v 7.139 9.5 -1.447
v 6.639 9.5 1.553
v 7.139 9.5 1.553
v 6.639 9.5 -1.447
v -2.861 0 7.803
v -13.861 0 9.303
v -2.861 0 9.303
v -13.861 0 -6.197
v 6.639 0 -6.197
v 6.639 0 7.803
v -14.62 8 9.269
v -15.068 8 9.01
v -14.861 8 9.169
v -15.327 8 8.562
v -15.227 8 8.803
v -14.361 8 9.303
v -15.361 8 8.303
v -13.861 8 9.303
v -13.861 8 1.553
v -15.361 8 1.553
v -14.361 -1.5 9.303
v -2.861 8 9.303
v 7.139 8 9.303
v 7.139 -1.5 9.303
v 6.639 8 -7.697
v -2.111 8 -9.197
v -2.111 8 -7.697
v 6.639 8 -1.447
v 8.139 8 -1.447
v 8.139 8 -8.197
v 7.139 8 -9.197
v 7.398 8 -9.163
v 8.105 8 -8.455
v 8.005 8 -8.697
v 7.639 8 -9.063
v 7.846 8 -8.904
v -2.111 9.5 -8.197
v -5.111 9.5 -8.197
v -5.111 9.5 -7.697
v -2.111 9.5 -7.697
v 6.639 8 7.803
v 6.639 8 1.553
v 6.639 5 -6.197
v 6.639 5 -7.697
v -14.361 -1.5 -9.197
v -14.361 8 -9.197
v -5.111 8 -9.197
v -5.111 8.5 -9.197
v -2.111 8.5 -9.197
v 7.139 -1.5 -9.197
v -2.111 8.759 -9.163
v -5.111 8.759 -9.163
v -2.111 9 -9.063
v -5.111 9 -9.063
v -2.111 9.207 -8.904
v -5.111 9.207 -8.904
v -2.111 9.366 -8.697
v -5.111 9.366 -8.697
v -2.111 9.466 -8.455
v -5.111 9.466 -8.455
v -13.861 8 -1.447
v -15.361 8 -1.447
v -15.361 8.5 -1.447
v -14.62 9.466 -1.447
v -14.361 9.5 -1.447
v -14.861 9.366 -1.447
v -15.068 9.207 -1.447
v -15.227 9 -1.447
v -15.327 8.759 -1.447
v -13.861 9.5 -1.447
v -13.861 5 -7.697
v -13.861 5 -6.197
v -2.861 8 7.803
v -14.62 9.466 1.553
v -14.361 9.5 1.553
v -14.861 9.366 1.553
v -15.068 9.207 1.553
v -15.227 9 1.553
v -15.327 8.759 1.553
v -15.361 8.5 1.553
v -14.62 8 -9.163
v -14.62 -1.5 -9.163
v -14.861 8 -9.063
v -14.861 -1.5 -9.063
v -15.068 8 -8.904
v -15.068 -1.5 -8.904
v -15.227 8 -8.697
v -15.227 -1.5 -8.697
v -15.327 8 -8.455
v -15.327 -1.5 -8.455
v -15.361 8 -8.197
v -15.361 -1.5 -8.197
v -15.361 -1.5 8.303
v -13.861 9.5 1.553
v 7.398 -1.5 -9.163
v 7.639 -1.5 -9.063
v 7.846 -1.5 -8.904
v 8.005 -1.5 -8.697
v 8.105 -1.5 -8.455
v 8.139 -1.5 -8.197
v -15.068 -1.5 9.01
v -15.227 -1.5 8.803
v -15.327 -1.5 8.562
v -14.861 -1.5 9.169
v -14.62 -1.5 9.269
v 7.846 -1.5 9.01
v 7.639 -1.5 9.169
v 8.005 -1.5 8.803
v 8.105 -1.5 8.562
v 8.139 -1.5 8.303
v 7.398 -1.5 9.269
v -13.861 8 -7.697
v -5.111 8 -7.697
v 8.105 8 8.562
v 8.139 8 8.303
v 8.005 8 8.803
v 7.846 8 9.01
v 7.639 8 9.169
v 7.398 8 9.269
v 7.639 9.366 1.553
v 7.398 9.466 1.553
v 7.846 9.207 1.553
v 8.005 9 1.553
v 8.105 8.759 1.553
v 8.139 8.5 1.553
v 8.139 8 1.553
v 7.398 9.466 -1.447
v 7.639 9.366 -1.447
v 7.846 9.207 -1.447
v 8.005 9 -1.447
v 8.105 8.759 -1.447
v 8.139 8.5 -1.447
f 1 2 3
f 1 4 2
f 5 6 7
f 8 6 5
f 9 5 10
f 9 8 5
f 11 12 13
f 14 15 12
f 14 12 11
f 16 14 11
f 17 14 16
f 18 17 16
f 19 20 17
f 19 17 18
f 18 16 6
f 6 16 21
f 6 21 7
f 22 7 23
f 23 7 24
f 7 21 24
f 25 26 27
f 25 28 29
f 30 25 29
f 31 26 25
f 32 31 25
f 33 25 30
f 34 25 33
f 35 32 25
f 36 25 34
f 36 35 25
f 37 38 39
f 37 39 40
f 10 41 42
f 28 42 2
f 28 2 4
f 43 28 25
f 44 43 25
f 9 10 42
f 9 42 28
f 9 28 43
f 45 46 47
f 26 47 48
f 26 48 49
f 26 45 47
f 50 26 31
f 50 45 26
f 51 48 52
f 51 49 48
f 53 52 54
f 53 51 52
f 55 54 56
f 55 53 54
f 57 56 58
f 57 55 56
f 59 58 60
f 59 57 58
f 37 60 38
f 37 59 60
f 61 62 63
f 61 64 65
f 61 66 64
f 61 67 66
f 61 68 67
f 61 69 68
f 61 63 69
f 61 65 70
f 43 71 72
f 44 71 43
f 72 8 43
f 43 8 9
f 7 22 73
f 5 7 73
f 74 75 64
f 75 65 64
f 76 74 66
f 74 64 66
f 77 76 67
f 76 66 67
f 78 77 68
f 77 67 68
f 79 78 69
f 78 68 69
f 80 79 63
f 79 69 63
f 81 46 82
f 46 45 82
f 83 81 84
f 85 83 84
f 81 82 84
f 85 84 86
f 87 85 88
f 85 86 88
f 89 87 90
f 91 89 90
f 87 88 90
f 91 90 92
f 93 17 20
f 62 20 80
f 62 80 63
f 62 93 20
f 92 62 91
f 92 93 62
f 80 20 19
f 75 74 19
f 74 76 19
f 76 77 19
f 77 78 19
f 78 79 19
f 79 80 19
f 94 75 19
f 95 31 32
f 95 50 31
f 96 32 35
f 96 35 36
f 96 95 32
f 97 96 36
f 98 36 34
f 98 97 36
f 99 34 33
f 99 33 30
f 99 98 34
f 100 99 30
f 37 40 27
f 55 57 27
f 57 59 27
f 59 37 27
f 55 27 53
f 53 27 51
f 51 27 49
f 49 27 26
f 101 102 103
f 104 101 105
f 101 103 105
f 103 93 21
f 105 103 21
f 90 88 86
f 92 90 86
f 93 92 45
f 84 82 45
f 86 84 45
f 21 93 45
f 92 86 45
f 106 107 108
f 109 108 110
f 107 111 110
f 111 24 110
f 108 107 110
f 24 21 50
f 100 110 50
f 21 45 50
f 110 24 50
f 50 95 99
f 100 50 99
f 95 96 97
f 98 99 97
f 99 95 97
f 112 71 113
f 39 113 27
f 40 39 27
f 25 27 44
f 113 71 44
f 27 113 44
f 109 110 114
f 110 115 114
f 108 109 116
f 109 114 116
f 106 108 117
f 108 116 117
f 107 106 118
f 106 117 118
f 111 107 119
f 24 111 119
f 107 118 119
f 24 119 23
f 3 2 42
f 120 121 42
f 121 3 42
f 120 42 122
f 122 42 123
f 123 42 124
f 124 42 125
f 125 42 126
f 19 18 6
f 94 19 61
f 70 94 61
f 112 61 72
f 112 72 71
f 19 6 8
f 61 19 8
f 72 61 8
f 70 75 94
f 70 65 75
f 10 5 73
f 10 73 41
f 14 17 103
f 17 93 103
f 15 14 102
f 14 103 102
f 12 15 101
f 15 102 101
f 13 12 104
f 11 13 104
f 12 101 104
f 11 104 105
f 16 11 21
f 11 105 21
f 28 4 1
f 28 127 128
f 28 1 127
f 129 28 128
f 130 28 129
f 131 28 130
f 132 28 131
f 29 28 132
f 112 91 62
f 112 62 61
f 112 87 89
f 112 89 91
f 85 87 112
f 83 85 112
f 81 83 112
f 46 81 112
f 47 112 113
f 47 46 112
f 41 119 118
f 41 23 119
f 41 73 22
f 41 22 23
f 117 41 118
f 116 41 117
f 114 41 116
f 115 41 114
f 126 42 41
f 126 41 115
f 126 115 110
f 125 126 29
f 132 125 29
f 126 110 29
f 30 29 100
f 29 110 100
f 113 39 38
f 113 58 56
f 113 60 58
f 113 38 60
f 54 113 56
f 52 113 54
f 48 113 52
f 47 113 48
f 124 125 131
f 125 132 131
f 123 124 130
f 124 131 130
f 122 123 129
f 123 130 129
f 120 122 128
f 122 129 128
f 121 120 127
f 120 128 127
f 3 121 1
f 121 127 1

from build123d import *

# Parameters (mm, degrees)
SKETCH1_W                 = 20.5
SKETCH1_H                 = 15.5
BOSS_EXTRUDE1_DEPTH       = 8
SHELL1_T                  = 1.5
BOSS_EXTRUDE2_START       = 8
BOSS_EXTRUDE2_OUTLINE_W   = 1.5
BOSS_EXTRUDE2_OUTLINE_H   = 3
BOSS_EXTRUDE2_OUTLINE_W_2 = 3
BOSS_EXTRUDE2_OUTLINE_H_2 = 1.5
BOSS_EXTRUDE2_DEPTH       = 1.5
SKETCH3_W                 = 10
SKETCH3_H                 = 1.5
CUT_EXTRUDE1_DEPTH        = 8
SKETCH4_W                 = 20.5
SKETCH4_H                 = 1.5
BOSS_EXTRUDE3_DEPTH       = 5
FILLET1_R                 = 1
FILLET2_R                 = 1
FILLET3_R                 = 1
SKETCH5_W                 = 1
SKETCH5_H                 = 1.5
CUT_EXTRUDE3_DEPTH        = 8


# Read off the part's stored shape, not the designer's step: Boss-Extrude2
with BuildPart() as part:
    # Sketch1 → Boss-Extrude1 (new body)
    with BuildSketch(Plane(origin=(0, 0, 0), x_dir=(1, 0, 0), z_dir=(0, 1, 0))):
        with Locations((-3.611209964, -0.053380783)):
            Rectangle(SKETCH1_W, SKETCH1_H)
    extrude(amount=BOSS_EXTRUDE1_DEPTH)

    # Shell1
    shell1_openings = [part.faces().sort_by_distance(p)[0] for p in [
        (-3.611209964, 8, 0.053380783),
    ]]
    offset(amount=SHELL1_T, openings=shell1_openings, kind=Kind.INTERSECTION)

    # Boss-Extrude2 outline → Boss-Extrude2 (add)
    with BuildSketch(Plane(origin=(0, 0, 0), x_dir=(1, 0, 0), z_dir=(0, 1, 0)).offset(BOSS_EXTRUDE2_START)):
        with Locations((-14.611209964, -0.053380783)):
            Rectangle(BOSS_EXTRUDE2_OUTLINE_W, BOSS_EXTRUDE2_OUTLINE_H)
        with Locations((-3.611209964, 8.446619217)):
            Rectangle(BOSS_EXTRUDE2_OUTLINE_W_2, BOSS_EXTRUDE2_OUTLINE_H_2)
        with Locations((7.388790036, -0.053380783)):
            Rectangle(BOSS_EXTRUDE2_OUTLINE_W, BOSS_EXTRUDE2_OUTLINE_H)
    extrude(amount=BOSS_EXTRUDE2_DEPTH)

    # Sketch3 → Cut-Extrude1 (cut)
    with BuildSketch(Plane(origin=(0, 8, 0), x_dir=(1, 0, 0), z_dir=(0, 1, 0))):
        with Locations((-8.861209964, -8.553380783)):
            Rectangle(SKETCH3_W, SKETCH3_H)
    extrude(amount=-CUT_EXTRUDE1_DEPTH, mode=Mode.SUBTRACT)

    # Sketch4 → Boss-Extrude3 (add)
    with BuildSketch(Plane(origin=(0, 0, 0), x_dir=(1, 0, 0), z_dir=(0, 1, 0))):
        with Locations((-3.611209964, 6.946619217)):
            Rectangle(SKETCH4_W, SKETCH4_H)
    extrude(amount=BOSS_EXTRUDE3_DEPTH)

    # Fillet1
    fillet1_edges = [part.edges().sort_by_distance(p)[0] for p in [
        (-15.361209964, 9.5, 0.053380783),
    ]]
    fillet(fillet1_edges, radius=FILLET1_R)

    # Fillet2
    fillet2_edges = [part.edges().sort_by_distance(p)[0] for p in [
        (-3.611209964, 9.5, -9.196619217),
        (8.138790036, 9.5, 0.053380783),
    ]]
    fillet(fillet2_edges, radius=FILLET2_R)

    # Fillet3
    fillet3_edges = [part.edges().sort_by_distance(p)[0] for p in [
        (-15.361209964, 3.25, -9.196619217),
        (8.138790036, 3.25, -9.196619217),
        (8.138790036, 3.25, 9.303380783),
        (-15.361209964, 3.25, 9.303380783),
    ]]
    fillet(fillet3_edges, radius=FILLET3_R)

    # Sketch5 → Cut-Extrude3 (cut)
    with BuildSketch(Plane(origin=(0, 8, 0), x_dir=(1, 0, 0), z_dir=(0, 1, 0))):
        with Locations((-3.361209964, -8.553380783)):
            Rectangle(SKETCH5_W, SKETCH5_H)
    extrude(amount=-CUT_EXTRUDE3_DEPTH, mode=Mode.SUBTRACT)


solid = part.part
